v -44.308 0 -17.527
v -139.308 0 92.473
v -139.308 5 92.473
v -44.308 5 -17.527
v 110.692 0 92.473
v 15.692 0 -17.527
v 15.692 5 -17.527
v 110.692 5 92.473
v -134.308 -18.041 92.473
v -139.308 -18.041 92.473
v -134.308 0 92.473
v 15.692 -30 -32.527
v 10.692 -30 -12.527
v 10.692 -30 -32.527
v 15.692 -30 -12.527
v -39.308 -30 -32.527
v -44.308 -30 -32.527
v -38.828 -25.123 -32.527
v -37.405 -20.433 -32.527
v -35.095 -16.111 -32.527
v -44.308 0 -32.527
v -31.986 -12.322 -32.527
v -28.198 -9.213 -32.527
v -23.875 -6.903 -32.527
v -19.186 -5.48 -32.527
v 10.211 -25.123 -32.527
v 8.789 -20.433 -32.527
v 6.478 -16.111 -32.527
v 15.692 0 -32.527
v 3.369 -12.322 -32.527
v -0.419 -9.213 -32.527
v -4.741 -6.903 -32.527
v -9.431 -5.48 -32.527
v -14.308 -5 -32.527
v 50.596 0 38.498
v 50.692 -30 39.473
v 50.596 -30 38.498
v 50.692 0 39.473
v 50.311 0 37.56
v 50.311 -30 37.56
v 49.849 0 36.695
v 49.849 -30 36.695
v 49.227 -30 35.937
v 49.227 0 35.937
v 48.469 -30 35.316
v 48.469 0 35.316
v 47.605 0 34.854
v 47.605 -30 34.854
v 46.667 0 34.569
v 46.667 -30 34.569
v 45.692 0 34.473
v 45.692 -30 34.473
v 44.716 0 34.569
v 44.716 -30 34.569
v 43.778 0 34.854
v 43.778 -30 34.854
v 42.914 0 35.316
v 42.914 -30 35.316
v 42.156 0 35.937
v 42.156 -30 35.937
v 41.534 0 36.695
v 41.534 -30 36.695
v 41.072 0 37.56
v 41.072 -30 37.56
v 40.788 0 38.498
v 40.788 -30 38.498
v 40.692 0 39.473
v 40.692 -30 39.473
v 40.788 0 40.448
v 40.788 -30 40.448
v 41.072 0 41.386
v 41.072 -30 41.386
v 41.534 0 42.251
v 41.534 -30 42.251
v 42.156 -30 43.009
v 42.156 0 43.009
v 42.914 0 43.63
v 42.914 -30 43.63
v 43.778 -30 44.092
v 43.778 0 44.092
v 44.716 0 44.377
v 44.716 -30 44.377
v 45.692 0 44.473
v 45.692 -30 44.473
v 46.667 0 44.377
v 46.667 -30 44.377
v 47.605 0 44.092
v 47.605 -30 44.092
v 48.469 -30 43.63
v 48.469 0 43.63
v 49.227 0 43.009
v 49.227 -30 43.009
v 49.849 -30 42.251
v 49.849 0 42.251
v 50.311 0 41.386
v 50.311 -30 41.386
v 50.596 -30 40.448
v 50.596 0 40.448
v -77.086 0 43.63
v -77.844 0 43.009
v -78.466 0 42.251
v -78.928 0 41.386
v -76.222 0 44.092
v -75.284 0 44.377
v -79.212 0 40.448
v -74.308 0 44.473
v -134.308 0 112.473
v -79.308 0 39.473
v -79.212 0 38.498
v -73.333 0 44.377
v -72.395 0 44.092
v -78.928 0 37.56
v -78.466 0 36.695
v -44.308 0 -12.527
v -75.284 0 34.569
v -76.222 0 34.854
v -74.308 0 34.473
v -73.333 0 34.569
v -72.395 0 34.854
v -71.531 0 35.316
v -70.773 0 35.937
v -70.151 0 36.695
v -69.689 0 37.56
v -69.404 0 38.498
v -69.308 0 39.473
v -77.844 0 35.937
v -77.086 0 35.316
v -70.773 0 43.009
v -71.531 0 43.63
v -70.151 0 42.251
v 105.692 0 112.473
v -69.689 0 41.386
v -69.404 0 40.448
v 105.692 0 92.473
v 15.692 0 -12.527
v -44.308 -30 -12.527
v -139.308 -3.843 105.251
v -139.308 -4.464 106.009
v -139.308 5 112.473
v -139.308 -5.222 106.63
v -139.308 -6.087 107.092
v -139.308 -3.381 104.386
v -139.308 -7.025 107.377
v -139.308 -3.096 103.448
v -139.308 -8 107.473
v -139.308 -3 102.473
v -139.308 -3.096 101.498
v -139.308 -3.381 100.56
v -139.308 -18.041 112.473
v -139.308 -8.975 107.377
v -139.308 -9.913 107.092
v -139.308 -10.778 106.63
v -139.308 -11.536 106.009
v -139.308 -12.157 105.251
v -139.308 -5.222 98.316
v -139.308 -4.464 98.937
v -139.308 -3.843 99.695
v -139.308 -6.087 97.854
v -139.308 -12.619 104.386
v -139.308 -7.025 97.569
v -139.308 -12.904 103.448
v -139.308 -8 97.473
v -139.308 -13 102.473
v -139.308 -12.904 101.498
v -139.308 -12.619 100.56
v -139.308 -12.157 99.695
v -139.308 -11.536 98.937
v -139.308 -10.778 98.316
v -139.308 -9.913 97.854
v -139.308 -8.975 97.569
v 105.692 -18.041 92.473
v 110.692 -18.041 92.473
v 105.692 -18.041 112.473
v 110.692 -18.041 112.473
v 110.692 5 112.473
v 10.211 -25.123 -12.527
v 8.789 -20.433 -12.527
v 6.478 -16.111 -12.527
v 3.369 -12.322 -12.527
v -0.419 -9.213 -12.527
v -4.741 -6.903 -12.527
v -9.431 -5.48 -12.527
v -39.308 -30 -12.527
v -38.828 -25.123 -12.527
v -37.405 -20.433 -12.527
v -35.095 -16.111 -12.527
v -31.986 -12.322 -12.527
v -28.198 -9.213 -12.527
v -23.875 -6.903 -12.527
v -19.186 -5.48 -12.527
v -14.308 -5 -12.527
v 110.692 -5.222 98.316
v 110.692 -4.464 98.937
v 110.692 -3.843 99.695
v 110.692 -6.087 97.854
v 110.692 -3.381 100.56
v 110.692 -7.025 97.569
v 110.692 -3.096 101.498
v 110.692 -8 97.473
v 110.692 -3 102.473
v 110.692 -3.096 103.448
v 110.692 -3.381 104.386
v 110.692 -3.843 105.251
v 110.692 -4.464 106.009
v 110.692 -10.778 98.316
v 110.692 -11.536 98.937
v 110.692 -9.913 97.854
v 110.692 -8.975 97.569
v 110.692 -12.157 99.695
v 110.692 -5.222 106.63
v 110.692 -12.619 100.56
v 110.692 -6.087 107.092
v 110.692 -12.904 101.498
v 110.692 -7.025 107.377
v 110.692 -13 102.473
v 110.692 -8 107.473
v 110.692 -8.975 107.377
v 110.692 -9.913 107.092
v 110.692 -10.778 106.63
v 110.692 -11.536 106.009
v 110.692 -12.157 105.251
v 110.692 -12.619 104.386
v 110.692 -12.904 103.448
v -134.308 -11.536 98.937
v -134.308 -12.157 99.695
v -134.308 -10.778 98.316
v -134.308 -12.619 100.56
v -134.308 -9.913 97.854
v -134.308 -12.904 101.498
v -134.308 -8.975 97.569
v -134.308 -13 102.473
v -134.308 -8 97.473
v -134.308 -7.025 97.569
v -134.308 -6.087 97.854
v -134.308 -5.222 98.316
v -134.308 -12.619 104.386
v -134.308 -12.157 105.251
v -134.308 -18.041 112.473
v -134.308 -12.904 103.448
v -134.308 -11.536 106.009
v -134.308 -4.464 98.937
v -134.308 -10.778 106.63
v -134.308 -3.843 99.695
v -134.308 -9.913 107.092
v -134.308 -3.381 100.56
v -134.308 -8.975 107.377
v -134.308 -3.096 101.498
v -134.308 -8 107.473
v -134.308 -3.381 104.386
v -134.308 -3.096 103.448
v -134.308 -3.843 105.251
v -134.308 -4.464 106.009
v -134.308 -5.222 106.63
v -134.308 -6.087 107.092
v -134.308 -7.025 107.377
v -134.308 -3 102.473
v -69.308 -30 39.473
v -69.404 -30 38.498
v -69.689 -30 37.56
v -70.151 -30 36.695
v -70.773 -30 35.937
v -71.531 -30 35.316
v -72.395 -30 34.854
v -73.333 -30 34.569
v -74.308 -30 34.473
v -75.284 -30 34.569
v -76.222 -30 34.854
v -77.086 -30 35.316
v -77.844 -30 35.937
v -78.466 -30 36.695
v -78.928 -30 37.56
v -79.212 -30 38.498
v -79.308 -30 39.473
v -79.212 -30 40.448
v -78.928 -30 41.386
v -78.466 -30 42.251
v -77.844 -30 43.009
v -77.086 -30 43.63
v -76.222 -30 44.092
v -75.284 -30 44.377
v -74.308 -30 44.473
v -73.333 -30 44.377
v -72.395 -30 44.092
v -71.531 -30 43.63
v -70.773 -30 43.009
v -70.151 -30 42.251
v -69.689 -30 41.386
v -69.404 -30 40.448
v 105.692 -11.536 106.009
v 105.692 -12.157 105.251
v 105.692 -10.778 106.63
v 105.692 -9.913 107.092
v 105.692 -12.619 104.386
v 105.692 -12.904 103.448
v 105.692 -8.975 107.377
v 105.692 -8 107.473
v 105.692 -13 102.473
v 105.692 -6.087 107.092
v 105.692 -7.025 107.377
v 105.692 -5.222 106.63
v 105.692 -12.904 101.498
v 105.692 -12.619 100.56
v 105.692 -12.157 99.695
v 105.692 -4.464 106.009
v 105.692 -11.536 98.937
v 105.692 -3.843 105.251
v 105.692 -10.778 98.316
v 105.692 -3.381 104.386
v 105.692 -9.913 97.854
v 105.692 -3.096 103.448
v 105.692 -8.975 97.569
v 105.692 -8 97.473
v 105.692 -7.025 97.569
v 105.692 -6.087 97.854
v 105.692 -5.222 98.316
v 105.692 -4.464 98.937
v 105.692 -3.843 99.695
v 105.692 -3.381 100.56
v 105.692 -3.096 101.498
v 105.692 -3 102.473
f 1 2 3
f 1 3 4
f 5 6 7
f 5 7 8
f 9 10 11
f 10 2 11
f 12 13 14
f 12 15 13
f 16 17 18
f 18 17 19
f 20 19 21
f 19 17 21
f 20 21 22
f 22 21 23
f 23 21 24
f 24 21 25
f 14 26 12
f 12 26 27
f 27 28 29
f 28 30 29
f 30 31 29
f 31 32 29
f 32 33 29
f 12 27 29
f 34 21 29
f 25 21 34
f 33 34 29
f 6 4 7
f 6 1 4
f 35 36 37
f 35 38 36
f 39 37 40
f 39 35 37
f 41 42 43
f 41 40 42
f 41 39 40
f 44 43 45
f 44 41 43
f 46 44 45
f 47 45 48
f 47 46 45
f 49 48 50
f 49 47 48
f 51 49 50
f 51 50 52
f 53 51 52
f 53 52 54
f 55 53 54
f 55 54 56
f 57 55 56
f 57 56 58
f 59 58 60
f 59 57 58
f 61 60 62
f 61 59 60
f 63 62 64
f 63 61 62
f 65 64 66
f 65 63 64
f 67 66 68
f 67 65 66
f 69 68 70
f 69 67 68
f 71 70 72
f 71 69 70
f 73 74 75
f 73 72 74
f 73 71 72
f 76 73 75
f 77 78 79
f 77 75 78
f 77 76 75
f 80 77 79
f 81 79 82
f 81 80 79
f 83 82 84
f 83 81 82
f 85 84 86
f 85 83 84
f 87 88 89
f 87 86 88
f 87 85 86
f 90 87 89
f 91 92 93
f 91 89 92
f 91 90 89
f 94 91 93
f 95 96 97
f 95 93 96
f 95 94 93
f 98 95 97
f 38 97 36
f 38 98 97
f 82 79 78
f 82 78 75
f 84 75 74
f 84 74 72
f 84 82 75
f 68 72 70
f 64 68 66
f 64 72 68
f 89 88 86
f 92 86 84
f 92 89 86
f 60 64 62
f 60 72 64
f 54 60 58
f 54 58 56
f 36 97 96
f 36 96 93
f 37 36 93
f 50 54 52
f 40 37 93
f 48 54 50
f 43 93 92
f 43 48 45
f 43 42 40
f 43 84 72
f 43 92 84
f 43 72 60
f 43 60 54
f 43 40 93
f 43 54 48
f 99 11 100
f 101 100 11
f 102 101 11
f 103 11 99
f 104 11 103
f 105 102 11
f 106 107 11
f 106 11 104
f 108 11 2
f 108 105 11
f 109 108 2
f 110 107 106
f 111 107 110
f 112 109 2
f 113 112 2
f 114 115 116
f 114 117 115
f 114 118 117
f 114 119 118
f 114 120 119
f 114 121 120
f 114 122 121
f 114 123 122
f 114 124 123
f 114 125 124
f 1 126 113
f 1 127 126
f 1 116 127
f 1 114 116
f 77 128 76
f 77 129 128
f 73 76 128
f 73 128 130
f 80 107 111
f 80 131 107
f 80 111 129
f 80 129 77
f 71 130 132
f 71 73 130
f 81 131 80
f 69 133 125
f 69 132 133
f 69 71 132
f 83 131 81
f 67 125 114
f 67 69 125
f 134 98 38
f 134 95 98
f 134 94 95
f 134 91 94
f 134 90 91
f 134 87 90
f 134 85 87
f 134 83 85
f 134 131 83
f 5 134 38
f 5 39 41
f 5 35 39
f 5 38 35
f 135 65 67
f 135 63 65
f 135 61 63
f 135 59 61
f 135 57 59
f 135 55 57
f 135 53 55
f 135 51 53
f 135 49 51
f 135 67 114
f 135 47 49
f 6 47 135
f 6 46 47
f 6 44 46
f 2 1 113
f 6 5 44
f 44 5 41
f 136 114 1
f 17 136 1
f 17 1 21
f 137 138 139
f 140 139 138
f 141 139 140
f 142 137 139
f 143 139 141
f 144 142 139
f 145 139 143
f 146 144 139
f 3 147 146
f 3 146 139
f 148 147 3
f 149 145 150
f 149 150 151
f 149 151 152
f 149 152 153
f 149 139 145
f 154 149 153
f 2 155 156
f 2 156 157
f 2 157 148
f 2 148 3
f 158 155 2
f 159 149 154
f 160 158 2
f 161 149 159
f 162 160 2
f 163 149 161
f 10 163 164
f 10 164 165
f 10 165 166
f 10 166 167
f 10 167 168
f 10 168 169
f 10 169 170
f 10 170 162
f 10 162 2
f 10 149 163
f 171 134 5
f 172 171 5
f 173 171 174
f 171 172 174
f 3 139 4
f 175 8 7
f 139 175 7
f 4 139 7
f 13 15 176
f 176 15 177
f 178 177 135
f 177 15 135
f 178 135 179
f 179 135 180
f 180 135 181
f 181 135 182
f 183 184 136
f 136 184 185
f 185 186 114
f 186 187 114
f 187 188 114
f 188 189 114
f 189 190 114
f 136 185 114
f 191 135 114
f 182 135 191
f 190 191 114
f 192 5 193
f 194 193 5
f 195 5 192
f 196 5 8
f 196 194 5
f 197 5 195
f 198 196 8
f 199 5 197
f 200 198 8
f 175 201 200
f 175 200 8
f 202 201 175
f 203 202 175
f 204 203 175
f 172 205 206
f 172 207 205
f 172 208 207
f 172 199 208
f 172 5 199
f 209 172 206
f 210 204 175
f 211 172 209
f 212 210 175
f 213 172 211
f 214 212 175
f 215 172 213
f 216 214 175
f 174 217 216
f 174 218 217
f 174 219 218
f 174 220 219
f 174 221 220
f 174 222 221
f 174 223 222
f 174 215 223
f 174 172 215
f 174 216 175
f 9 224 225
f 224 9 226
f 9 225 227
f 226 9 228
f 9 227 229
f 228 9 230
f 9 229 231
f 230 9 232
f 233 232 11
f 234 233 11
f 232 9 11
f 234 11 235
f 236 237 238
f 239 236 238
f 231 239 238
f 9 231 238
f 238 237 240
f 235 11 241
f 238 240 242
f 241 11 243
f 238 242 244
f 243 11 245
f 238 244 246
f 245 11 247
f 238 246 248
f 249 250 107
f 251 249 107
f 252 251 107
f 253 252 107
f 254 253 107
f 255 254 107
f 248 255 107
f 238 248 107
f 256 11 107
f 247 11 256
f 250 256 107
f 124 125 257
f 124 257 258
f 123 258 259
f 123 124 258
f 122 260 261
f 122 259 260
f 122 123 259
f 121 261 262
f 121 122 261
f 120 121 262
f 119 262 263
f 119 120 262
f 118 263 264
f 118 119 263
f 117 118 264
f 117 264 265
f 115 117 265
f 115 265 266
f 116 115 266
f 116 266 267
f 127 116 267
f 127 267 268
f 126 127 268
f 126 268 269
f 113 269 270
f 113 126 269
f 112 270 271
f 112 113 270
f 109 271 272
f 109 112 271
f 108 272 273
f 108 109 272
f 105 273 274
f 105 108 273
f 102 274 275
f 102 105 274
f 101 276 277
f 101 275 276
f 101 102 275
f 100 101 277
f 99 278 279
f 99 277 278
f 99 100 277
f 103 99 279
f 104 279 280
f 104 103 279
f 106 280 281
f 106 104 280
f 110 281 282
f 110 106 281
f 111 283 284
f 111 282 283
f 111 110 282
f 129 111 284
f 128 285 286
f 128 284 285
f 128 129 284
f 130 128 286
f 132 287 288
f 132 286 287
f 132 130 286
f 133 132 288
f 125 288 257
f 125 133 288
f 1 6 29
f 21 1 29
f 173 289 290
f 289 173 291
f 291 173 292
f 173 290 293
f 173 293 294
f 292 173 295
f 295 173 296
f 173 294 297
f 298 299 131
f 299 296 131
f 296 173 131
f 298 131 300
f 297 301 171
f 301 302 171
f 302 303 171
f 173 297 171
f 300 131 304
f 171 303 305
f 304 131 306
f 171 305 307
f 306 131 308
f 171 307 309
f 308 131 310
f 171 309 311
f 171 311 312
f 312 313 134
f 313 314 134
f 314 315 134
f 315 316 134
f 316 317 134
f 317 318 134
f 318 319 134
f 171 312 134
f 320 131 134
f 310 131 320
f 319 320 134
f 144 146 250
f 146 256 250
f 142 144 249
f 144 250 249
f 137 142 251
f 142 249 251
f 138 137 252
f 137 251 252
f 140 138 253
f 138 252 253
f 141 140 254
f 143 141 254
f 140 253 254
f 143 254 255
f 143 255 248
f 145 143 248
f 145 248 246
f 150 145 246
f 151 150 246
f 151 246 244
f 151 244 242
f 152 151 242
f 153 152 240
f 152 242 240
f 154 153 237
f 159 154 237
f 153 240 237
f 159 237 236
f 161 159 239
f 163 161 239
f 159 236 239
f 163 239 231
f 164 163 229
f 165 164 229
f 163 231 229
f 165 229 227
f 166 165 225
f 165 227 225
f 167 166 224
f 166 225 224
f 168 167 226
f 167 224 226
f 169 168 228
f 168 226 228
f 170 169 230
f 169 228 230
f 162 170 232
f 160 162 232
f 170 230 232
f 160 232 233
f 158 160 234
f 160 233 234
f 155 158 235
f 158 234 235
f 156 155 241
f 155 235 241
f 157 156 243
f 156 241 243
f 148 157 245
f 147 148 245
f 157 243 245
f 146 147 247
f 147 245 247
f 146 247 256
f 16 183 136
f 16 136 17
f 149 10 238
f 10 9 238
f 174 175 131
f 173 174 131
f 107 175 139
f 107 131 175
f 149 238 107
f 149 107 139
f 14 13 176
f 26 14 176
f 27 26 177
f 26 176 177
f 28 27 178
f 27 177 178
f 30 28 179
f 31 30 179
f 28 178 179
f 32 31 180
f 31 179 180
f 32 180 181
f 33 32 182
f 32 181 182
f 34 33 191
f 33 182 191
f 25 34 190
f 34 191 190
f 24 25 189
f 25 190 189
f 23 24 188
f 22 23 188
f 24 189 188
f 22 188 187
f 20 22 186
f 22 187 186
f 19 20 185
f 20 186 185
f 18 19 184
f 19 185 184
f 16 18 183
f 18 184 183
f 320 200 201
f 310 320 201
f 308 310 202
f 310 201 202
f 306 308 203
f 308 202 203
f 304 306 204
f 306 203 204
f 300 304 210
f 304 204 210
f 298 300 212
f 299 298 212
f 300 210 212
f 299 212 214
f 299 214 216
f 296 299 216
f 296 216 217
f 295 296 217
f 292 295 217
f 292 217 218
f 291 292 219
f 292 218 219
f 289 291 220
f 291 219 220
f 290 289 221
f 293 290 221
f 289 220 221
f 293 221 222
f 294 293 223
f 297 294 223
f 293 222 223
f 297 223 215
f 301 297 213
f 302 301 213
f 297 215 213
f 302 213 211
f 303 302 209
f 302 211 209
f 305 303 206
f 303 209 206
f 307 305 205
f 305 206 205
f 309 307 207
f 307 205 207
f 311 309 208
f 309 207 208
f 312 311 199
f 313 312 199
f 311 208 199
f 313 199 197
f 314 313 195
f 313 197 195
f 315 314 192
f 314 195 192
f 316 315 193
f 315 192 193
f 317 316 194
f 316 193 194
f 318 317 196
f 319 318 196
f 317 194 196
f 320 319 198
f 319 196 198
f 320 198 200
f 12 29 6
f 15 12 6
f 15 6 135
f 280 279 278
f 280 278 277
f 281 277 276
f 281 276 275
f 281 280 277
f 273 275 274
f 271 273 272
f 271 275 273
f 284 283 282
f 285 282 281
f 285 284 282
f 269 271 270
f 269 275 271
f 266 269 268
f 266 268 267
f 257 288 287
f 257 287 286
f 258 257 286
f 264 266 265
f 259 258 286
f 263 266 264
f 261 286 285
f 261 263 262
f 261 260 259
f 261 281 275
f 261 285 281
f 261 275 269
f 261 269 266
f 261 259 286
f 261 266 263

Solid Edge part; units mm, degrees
sketch "Sketch1" plane through (0, 0, 0) normal (0, -1, 0) x (1, 0, 0)
  line L0 (110.6916, 92.473) -> (110.6916, 112.473)
  line L1 (110.6916, 112.473) -> (-139.3084, 112.473)
  line L2 (-139.3084, 112.473) -> (-139.3084, 92.473)
  line L3 (-139.3084, 92.473) -> (-44.3084, -17.527)
  line L4 (-44.3084, -17.527) -> (15.6916, -17.527)
  line L5 (15.6916, -17.527) -> (110.6916, 92.473)
  dimension "D1" = 20
  dimension "D2" = 250
  dimension "D3" = 60
  dimension "D4" = 130
  dimension "D5" = 20
extrude "ExtrudedProtrusion_1" add sketch "Sketch1" against normal blind 5
sketch "Sketch2" plane through (10.6916, 0, 44.973) normal (0, -1, 0) x (1, 0, 0)
  line L0 (95, 47.5) -> (100, 47.5)
  line L1 (100, 47.5) -> (100, 67.5)
  line L2 (100, 67.5) -> (95, 67.5)
  line L3 (95, 67.5) -> (95, 47.5)
  line L4 (-55, -77.5) -> (5, -77.5)
  line L5 (5, -77.5) -> (5, -57.5)
  line L6 (5, -57.5) -> (-55, -57.5)
  line L7 (-55, -57.5) -> (-55, -77.5)
  circle A0 centre (-85, -5.5) radius 5
  circle A1 centre (35, -5.5) radius 5
  line L8 (-150, 47.5) -> (-145, 47.5)
  line L9 (-145, 47.5) -> (-145, 67.5)
  line L10 (-145, 67.5) -> (-150, 67.5)
  line L11 (-150, 67.5) -> (-150, 47.5)
  dimension "D1" = 20
  dimension "D2" = 5
  dimension "D3" = 5
  dimension "D4" = 20
  dimension "D5" = 5
  dimension "D6" = 20
  dimension "D7" = 60
  dimension "D8" = 15
  dimension "D9" = 10
  dimension "D10" = 10
  dimension "D11" = 60
  dimension "D12" = 60
  dimension "D13" = 52
extrude "Protrusion1" add sketch "Sketch2" along normal blind 30
sketch "Sketch3" plane through (-14.3084, -50, 24.202) normal (0, 0, 1) x (0, 1, 0)
  circle A0 centre (20, 0) radius 25
  dimension "D1" = 50
extrude "Cutout1" cut sketch "Sketch3" against normal through all
sketch "Sketch4" plane through (110.6916, -12.5, 102.473) normal (1, 0, 0) x (0, 1, 0)
  line L0 (-19.8844, -11.6156) -> (-5.5406, -11.6156)
  line L1 (-5.5406, -11.6156) -> (-5.5406, 11.1656)
  line L2 (-5.5406, 11.1656) -> (-19.8844, 11.1656)
  line L3 (-19.8844, 11.1656) -> (-19.8844, -11.6156)
  circle A0 centre (4.5, 0) radius 5
  dimension "D1" = 13
extrude "ExtrudedCutout_3" cut sketch "Sketch4" against normal blind 287.5314
